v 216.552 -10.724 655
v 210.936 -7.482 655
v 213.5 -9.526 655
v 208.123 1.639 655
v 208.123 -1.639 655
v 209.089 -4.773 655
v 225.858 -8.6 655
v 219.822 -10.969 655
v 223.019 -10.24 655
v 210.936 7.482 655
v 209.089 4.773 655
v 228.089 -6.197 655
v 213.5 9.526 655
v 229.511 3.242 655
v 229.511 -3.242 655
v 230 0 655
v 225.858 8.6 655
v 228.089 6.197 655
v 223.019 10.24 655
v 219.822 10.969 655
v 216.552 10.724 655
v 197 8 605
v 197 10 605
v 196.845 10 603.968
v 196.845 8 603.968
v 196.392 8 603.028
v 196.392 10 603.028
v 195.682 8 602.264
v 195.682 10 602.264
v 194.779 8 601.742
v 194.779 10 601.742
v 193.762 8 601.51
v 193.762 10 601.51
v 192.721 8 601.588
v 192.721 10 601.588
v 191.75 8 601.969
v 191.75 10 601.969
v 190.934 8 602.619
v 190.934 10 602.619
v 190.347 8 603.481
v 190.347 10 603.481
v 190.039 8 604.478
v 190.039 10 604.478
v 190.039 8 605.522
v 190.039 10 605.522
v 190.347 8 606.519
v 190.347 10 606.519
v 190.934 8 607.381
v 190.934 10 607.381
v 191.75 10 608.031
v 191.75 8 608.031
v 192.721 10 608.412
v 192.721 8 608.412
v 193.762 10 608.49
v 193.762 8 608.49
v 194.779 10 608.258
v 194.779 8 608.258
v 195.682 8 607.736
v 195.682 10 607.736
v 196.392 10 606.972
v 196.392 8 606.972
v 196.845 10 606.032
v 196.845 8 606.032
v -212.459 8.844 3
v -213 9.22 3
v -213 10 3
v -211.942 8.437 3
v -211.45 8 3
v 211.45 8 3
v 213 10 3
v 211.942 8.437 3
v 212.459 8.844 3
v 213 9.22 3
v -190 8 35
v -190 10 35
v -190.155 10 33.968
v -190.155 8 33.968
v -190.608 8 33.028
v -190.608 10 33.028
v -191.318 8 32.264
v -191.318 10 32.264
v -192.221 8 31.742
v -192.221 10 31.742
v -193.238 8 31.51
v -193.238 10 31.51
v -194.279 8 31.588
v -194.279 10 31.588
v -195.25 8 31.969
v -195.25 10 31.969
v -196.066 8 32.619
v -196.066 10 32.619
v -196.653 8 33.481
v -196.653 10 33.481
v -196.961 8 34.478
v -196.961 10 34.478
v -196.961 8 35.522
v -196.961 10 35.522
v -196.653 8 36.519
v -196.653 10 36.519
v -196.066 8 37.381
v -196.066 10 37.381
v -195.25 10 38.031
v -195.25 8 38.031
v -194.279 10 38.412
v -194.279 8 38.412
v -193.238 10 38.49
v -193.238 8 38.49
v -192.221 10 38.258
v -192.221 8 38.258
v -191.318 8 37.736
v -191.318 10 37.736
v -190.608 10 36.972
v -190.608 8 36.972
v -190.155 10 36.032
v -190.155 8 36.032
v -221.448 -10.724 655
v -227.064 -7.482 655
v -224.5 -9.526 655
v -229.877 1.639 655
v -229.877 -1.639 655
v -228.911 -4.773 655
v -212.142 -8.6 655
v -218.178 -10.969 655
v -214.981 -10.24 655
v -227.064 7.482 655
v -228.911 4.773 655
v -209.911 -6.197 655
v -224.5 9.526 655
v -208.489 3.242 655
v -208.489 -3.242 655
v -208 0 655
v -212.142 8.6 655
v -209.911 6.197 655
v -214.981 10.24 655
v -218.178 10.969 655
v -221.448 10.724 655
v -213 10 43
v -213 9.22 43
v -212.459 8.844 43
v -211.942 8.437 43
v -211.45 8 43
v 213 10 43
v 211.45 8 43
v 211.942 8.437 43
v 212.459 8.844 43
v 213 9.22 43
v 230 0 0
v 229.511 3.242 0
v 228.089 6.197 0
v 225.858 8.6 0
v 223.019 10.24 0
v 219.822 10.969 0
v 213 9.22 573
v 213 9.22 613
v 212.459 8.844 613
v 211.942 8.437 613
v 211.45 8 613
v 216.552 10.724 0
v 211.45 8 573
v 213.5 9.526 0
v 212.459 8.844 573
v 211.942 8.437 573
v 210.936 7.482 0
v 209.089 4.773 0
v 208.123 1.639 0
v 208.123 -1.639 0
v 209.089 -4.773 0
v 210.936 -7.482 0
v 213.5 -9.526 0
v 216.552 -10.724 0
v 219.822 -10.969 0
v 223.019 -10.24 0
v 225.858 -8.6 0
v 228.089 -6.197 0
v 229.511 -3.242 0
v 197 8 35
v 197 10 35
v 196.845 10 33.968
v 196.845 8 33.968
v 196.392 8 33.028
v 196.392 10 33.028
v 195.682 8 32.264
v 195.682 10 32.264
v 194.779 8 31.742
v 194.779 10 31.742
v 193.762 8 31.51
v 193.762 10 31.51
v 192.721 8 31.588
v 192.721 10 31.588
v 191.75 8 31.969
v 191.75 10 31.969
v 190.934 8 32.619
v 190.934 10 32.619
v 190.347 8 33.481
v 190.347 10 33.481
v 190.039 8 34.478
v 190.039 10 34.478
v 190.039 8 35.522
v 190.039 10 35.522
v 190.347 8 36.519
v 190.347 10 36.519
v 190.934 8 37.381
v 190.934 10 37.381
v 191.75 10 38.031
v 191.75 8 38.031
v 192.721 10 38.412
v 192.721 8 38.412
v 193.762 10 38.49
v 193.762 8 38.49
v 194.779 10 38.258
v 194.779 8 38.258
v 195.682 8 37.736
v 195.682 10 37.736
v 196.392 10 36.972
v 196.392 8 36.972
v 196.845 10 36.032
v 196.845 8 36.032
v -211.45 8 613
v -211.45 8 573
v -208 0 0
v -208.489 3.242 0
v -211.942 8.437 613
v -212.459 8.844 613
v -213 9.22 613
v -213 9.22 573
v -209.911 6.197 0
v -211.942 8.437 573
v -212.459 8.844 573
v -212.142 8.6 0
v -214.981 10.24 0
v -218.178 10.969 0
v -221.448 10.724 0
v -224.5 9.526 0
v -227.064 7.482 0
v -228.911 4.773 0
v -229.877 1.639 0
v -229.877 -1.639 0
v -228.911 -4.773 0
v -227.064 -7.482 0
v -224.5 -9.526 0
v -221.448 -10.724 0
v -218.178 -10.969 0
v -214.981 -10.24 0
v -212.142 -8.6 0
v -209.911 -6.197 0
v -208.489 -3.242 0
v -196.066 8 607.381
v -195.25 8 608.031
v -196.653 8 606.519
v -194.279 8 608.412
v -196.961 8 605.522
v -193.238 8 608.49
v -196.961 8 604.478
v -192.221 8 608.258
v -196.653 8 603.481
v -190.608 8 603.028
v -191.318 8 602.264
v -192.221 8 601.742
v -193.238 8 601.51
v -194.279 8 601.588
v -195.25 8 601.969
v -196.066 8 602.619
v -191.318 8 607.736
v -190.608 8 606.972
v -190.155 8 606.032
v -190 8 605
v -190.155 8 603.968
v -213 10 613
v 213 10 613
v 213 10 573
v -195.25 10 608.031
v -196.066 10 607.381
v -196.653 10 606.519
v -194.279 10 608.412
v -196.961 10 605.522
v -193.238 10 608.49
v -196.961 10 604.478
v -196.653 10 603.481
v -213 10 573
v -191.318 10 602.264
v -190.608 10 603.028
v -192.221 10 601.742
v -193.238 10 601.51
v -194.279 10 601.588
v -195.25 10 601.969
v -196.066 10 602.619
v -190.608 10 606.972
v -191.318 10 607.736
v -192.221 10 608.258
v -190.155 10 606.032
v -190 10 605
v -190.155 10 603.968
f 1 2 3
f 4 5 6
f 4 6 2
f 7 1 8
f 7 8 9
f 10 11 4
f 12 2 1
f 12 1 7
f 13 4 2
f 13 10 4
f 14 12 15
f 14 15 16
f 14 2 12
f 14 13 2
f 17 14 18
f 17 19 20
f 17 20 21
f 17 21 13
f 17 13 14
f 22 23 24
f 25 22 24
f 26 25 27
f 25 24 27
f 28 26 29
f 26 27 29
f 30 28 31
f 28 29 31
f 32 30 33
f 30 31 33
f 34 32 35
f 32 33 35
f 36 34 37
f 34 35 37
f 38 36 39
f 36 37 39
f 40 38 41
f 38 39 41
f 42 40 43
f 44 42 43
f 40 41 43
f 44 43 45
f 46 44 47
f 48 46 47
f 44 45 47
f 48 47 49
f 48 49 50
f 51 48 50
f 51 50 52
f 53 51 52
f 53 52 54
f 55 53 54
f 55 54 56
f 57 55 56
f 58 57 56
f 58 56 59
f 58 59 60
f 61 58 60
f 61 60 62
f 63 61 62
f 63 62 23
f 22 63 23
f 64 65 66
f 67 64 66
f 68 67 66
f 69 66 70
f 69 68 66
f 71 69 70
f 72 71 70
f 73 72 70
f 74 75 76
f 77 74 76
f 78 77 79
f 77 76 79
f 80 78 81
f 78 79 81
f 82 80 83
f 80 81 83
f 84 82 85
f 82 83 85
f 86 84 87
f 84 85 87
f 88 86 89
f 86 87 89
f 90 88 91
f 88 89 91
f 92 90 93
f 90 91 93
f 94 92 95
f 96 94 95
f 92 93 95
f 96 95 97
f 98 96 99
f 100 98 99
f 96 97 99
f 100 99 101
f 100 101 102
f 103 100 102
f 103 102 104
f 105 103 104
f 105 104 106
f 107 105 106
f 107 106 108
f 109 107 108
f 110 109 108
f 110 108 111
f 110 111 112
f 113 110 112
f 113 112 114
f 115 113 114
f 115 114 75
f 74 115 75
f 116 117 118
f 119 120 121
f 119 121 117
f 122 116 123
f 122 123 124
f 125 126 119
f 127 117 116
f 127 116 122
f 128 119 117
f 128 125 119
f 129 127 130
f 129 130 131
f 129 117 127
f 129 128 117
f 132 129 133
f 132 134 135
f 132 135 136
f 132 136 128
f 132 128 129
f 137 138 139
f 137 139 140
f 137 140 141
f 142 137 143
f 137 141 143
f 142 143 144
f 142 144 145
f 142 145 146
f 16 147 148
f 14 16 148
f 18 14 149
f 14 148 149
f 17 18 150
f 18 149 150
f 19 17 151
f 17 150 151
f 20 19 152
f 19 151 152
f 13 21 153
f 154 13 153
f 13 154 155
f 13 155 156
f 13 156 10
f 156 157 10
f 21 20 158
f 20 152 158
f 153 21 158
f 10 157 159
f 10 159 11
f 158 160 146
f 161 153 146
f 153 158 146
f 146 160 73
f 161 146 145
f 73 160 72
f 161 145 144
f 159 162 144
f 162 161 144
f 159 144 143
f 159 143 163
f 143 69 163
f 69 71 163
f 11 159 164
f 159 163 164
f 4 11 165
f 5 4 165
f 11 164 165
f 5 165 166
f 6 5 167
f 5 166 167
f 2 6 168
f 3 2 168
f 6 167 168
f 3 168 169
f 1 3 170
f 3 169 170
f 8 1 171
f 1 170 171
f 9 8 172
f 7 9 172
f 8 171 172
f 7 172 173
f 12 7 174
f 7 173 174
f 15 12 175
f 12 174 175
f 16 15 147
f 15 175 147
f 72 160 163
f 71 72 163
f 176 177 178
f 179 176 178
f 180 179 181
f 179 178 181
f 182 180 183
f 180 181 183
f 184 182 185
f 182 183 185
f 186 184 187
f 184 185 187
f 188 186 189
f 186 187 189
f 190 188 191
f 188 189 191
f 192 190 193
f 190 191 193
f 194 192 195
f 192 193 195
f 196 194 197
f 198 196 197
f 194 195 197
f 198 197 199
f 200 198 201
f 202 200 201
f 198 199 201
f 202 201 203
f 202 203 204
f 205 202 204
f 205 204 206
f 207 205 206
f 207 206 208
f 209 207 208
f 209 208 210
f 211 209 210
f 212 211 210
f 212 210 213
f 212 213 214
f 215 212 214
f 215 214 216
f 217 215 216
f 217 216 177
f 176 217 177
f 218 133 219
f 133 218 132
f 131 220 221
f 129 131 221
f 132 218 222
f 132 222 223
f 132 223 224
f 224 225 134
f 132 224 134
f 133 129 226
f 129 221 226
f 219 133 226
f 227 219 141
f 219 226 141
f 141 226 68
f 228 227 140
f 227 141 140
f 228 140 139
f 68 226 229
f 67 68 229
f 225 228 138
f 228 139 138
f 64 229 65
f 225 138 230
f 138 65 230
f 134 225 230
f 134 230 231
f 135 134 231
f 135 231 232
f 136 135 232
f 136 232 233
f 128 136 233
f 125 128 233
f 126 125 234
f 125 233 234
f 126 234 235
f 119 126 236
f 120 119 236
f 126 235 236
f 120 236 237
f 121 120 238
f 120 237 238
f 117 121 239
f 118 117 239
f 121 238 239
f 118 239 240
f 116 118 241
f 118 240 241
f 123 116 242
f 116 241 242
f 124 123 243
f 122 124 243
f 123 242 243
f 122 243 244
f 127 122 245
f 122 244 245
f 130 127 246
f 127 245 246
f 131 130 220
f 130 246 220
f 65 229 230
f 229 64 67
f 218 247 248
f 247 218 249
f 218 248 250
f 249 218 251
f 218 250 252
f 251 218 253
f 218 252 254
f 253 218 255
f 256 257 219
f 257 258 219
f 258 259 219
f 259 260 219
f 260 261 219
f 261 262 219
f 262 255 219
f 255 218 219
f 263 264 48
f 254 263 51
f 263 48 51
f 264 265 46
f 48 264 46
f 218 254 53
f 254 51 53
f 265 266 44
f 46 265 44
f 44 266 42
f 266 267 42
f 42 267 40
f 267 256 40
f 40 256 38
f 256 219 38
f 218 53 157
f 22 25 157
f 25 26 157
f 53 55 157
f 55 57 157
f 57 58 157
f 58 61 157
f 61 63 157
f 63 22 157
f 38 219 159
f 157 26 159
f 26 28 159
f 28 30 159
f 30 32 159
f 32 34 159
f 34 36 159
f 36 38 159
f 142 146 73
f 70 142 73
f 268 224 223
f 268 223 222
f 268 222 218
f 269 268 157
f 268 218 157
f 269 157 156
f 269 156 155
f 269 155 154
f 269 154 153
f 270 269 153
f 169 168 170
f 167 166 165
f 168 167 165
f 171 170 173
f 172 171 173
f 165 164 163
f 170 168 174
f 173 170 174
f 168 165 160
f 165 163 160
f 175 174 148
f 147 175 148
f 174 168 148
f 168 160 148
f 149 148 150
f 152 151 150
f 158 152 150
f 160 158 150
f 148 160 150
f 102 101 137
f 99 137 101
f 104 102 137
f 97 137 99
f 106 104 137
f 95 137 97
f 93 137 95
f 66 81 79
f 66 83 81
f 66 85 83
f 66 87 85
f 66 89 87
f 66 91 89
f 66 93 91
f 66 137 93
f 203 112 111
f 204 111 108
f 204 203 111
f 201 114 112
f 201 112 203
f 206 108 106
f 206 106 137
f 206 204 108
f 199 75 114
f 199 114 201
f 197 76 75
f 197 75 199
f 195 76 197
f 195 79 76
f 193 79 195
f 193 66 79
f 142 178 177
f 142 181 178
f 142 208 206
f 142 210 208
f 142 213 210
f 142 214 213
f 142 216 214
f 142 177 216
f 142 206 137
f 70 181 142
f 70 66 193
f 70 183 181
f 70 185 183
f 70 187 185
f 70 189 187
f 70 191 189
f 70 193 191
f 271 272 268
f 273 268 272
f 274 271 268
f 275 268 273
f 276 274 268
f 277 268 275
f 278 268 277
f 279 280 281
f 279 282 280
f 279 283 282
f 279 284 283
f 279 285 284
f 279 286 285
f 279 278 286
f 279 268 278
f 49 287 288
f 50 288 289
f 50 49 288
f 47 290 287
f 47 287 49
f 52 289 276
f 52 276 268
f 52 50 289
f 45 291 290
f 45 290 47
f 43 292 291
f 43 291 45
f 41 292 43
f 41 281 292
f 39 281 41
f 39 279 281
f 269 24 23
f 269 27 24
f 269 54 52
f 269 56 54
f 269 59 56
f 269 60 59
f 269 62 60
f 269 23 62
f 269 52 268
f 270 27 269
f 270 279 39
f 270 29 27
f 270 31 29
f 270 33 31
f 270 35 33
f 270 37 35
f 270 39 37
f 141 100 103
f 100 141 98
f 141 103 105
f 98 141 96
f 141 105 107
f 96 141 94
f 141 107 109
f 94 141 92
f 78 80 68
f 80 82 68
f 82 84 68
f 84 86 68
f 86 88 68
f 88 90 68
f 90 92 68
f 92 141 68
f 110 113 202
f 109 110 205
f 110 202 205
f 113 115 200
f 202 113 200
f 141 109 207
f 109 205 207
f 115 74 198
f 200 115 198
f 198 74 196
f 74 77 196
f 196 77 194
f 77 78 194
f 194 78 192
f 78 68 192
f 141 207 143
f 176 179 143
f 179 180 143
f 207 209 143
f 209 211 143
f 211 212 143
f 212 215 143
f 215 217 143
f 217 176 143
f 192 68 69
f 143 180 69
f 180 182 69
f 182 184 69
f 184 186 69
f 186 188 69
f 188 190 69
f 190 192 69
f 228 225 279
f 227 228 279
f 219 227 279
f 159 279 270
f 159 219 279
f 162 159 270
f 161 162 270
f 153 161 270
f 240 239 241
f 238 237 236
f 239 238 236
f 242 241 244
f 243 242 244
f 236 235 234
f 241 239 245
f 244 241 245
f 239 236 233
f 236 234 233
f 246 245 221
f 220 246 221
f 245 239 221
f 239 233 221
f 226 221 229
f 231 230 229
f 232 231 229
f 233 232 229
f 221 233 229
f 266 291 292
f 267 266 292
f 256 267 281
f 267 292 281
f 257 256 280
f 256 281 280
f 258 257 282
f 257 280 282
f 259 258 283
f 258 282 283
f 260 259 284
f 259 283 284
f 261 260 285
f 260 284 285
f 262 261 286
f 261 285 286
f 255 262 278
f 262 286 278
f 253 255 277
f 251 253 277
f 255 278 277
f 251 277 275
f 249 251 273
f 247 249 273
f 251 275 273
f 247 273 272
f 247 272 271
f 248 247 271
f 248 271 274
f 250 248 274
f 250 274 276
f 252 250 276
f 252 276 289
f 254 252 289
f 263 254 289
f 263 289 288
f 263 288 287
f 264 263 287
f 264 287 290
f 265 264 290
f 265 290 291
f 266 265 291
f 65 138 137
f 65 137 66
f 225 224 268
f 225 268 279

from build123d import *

# Parameters (mm, degrees)
SKETCH1_R             = 11
BOSS_EXTRUDE1_DEPTH   = 655
BOSS_EXTRUDE1_2_DEPTH = 655
SKETCH2_W             = 426
SKETCH2_H             = 40
BOSS_EXTRUDE2_DEPTH   = 2
LPATTERN1_COUNT       = 2
LPATTERN1_PITCH       = 570
SKETCH3_R             = 3.5
CUT_EXTRUDE1_DEPTH    = 22
SKETCH4_R             = 3.5
CUT_EXTRUDE2_DEPTH    = 22


with BuildPart() as part:
    # Sketch1 → Boss-Extrude1 (new body)
    with BuildSketch(Plane.XY):
        with Locations((-219, 0)):
            Circle(SKETCH1_R)
    extrude(amount=BOSS_EXTRUDE1_DEPTH)



with BuildPart() as body_2:
    # Sketch1 → Boss-Extrude1 2 (new body)
    with BuildSketch(Plane.XY):
        with Locations((219, 0)):
            Circle(SKETCH1_R)
    extrude(amount=BOSS_EXTRUDE1_2_DEPTH)


with BuildPart() as part_1:
    add(part.part)

    add(body_2.part)  # Boss-Extrude2 merges body 2
    # Sketch2 → Boss-Extrude2 (add)
    with BuildSketch(Plane(origin=(0, 8, 0), x_dir=(1, 0, 0), z_dir=(0, 1, 0))):
        with Locations((0, -23)):
            Rectangle(SKETCH2_W, SKETCH2_H)
    boss_extrude2 = extrude(amount=BOSS_EXTRUDE2_DEPTH)

    # LPattern1: Boss-Extrude2 ×2
    with Locations(*[(0, 0, i * LPATTERN1_PITCH) for i in range(1, LPATTERN1_COUNT)]):
        add(boss_extrude2)

    # Sketch3 → Cut-Extrude1 (cut, through all)
    with BuildSketch(Plane(origin=(0, 10, 0), x_dir=(1, 0, 0), z_dir=(0, 1, 0))):
        with Locations((-193.5, -35)):
            Circle(SKETCH3_R)
        with Locations((193.5, -35)):
            Circle(SKETCH3_R)
    extrude(amount=-CUT_EXTRUDE1_DEPTH, mode=Mode.SUBTRACT)

    # Sketch4 → Cut-Extrude2 (cut, through all)
    with BuildSketch(Plane(origin=(0, 10, 0), x_dir=(1, 0, 0), z_dir=(0, 1, 0))):
        with Locations((-193.5, -605)):
            Circle(SKETCH4_R)
        with Locations((193.5, -605)):
            Circle(SKETCH4_R)
    extrude(amount=-CUT_EXTRUDE2_DEPTH, mode=Mode.SUBTRACT)


solid = part_1.part
